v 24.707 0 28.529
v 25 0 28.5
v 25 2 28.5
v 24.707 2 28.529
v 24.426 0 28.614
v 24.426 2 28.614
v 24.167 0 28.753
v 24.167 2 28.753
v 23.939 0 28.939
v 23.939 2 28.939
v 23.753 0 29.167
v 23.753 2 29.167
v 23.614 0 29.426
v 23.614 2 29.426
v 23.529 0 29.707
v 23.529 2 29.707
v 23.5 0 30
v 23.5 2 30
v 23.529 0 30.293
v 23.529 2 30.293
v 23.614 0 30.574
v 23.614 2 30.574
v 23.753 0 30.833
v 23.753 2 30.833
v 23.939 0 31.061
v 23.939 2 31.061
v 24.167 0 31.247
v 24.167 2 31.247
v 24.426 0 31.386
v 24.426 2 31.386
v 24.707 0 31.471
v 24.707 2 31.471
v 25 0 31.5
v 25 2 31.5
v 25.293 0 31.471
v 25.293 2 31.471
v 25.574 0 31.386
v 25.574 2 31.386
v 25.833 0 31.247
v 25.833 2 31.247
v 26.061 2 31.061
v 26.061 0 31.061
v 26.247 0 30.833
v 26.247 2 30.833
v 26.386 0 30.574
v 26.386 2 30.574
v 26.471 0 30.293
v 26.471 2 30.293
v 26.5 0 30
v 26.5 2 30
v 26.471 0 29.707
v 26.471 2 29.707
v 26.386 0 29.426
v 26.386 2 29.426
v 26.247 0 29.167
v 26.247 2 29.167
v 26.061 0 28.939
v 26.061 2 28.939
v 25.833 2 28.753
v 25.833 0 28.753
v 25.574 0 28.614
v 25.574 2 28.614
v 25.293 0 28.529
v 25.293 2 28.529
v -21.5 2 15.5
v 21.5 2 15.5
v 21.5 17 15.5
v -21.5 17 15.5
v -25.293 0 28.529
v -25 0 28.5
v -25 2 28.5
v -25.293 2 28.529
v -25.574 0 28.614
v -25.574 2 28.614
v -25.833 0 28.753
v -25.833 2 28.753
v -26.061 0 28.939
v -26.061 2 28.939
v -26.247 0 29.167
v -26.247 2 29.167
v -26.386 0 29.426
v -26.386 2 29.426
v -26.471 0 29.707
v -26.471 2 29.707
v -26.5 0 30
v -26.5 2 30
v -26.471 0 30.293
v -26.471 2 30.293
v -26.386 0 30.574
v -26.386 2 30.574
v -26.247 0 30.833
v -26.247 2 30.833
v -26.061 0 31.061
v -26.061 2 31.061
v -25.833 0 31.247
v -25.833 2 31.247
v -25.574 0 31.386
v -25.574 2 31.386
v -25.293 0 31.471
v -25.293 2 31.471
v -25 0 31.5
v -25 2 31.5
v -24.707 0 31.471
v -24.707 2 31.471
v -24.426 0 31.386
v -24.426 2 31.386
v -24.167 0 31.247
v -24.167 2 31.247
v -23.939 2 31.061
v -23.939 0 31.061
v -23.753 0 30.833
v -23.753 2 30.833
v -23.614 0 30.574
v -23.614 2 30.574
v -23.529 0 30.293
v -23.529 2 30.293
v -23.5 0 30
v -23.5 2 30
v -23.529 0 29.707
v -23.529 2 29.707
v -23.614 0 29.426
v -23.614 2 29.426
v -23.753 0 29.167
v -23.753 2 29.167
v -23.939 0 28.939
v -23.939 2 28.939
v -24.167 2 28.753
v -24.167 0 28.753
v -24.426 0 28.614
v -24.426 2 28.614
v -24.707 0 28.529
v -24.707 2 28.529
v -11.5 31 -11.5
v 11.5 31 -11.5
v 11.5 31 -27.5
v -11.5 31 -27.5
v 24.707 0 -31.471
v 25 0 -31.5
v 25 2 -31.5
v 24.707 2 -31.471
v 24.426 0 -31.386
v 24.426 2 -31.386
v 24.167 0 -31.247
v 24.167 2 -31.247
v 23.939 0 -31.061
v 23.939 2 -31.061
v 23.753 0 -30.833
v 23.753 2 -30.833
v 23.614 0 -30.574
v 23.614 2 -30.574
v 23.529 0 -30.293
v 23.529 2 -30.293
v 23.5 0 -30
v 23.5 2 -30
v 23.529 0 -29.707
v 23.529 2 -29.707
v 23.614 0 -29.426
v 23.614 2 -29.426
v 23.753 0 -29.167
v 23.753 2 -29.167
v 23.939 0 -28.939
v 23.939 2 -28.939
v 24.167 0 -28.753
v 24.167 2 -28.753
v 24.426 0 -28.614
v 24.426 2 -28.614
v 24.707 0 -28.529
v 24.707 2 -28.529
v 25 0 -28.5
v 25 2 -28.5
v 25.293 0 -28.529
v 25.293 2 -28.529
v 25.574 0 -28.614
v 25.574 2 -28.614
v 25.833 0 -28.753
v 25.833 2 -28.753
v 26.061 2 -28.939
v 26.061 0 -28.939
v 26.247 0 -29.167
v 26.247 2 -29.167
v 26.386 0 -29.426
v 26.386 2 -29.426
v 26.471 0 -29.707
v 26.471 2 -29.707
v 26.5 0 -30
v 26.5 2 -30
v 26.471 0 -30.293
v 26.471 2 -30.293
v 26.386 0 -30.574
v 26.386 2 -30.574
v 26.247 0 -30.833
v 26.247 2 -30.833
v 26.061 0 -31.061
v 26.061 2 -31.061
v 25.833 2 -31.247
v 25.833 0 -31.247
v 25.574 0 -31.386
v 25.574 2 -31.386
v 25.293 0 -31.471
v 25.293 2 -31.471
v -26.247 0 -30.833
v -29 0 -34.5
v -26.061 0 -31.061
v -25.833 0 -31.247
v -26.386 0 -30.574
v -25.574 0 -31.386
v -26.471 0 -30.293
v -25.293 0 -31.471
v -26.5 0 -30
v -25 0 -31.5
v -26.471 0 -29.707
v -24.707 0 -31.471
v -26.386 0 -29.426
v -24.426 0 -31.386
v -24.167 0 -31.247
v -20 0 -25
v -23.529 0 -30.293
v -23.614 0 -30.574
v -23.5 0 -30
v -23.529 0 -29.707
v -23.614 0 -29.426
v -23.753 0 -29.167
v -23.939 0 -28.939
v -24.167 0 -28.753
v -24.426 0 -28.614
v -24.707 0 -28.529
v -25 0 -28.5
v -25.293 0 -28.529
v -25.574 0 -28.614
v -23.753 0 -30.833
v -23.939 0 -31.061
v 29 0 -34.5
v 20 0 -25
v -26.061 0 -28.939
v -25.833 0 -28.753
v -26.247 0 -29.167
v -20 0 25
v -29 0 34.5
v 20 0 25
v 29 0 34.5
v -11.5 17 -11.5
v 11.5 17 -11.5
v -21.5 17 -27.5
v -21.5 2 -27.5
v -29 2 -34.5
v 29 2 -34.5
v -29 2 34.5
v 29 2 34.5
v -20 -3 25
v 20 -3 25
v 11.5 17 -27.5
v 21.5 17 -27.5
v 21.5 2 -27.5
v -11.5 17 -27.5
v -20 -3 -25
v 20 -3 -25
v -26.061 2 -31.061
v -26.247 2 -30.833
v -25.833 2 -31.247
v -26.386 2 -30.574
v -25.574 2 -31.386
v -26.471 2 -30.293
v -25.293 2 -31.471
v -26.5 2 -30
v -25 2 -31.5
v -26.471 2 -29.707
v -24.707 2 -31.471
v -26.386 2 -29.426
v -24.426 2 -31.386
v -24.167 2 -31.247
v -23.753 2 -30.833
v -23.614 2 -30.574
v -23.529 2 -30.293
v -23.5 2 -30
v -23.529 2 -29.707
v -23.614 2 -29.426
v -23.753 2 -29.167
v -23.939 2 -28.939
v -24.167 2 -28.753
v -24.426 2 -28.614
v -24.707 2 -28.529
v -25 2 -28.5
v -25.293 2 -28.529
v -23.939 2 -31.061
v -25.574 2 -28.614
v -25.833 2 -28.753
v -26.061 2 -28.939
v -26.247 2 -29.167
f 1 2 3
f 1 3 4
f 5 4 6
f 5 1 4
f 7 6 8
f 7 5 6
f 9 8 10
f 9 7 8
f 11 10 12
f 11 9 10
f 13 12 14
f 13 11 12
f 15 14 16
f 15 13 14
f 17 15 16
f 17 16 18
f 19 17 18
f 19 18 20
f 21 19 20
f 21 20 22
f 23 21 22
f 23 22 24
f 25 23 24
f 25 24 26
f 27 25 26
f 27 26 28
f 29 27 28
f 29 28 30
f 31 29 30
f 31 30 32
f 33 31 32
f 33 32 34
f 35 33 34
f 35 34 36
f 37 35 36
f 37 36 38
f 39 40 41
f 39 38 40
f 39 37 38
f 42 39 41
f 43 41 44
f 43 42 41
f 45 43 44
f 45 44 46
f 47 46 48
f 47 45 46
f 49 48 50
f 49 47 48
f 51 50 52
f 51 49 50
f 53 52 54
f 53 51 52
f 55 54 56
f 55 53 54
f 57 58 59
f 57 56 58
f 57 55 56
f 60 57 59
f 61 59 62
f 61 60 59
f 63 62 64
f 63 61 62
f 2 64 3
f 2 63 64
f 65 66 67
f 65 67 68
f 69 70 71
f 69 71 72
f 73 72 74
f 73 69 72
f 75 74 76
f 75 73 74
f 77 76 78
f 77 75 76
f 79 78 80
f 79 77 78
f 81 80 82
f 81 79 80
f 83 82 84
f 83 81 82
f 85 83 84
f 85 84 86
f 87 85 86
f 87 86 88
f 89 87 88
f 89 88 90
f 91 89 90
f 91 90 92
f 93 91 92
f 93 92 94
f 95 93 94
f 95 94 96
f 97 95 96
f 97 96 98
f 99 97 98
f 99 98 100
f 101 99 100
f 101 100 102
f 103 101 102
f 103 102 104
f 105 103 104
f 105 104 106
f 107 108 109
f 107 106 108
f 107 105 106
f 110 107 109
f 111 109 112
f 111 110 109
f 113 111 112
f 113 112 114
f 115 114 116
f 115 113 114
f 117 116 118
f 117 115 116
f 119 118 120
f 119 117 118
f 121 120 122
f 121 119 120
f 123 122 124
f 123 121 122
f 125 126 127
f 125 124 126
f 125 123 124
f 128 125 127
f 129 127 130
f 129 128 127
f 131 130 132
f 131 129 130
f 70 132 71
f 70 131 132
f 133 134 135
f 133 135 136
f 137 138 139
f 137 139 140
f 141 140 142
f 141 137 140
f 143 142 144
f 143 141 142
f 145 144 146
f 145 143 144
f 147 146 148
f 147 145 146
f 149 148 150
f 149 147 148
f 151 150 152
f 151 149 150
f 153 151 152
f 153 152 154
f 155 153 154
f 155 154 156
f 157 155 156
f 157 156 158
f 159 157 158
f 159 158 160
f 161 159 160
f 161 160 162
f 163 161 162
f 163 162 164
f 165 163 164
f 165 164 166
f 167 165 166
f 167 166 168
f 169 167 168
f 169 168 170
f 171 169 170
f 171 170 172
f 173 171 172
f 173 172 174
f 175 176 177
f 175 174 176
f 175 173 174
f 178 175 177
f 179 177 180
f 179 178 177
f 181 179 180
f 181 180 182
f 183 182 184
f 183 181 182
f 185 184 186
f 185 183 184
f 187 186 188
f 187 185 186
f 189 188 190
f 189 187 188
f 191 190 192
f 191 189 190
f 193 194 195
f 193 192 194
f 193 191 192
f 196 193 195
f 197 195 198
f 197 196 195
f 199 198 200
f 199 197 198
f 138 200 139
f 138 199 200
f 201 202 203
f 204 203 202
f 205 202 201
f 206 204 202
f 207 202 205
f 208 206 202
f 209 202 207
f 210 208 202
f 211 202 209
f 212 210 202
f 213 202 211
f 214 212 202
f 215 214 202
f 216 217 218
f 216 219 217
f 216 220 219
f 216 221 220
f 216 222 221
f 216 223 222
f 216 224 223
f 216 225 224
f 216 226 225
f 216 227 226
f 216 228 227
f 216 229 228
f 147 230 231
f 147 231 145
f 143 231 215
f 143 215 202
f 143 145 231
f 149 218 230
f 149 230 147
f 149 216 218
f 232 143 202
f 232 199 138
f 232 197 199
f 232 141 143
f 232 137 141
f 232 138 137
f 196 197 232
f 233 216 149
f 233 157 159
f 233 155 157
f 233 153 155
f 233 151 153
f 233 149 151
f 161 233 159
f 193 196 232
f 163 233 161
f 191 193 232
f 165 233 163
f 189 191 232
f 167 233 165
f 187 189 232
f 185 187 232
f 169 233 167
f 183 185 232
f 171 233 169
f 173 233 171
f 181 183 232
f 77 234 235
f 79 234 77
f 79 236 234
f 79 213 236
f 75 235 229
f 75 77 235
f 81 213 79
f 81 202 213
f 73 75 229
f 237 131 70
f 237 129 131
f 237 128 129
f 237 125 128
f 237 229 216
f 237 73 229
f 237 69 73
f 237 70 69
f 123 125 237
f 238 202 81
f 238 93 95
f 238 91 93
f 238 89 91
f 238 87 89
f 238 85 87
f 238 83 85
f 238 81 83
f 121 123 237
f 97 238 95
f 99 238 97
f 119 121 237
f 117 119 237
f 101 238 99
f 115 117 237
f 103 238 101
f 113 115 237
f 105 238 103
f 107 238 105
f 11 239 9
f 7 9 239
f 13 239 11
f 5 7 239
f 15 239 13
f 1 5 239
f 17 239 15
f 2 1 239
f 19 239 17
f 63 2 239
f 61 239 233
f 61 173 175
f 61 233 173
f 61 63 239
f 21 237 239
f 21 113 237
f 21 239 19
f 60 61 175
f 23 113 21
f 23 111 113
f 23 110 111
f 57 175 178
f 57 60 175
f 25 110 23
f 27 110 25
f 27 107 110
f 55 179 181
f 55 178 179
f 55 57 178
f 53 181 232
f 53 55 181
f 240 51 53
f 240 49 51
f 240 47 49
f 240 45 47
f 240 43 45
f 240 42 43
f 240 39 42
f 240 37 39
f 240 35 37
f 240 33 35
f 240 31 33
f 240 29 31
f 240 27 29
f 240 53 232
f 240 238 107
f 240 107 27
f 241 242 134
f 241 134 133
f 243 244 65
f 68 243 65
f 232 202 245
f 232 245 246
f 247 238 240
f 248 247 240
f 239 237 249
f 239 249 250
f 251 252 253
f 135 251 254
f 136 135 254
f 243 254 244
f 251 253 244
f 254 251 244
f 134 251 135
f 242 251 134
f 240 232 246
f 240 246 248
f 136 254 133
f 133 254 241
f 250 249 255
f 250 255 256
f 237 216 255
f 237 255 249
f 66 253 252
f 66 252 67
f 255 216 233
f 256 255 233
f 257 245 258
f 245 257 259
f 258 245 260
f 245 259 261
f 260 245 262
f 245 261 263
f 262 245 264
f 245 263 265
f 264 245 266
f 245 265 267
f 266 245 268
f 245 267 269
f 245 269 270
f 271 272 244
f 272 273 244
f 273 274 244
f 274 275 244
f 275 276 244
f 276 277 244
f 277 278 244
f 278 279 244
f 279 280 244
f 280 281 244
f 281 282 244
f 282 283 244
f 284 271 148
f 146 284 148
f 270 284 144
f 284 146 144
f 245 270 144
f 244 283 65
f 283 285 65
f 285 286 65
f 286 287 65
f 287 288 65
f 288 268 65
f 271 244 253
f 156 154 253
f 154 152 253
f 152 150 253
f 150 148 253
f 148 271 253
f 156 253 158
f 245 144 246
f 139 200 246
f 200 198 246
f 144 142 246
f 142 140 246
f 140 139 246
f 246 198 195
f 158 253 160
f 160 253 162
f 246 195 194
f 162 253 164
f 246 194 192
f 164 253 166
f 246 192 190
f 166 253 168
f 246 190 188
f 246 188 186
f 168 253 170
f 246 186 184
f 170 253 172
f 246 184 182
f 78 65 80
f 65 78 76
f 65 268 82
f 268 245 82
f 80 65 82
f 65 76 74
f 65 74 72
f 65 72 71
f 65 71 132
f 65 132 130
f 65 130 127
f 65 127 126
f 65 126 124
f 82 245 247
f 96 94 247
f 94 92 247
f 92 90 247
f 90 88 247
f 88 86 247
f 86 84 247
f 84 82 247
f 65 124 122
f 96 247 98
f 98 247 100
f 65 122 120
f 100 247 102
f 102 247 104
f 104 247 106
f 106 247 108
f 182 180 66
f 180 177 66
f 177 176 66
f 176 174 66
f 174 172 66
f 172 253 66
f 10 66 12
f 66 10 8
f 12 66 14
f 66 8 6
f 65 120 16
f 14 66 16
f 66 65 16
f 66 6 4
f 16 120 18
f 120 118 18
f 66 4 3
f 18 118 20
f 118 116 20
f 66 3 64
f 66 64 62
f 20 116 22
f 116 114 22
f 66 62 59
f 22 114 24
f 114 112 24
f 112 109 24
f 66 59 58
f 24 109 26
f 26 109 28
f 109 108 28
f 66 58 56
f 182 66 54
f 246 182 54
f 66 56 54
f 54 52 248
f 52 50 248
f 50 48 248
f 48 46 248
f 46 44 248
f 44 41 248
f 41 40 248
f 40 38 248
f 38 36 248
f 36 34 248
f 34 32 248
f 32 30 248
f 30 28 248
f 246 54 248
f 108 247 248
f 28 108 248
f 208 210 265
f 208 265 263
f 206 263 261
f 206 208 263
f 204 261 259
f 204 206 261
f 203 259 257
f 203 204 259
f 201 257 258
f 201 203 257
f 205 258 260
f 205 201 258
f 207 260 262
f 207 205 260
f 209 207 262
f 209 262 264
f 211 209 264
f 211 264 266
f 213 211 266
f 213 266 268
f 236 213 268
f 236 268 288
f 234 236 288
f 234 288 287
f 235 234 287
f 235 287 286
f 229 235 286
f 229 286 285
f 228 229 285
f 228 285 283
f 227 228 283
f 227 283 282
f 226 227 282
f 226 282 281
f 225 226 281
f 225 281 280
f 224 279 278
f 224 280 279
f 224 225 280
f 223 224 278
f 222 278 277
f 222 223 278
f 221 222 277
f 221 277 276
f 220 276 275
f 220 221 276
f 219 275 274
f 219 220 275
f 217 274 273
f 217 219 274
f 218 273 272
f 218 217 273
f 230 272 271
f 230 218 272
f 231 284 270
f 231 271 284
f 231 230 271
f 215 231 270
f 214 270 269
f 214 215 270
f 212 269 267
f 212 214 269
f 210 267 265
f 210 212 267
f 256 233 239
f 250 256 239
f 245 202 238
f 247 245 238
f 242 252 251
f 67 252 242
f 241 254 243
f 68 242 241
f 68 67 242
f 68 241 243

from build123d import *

# Parameters (mm, degrees)
SKETCH_1_W                  = 58
SKETCH_1_H                  = 69
EXTRUDE_351_DEPTH           = 2
SKETCH_2_W                  = 43
SKETCH_2_H                  = 43
EXTRUDE_607_DEPTH           = 15
SKETCH_3_W                  = 23
SKETCH_3_H                  = 16
EXTRUDE_850_DEPTH           = 14
SKETCH_4_W                  = 40
SKETCH_4_H                  = 50
EXTRUDE_1071_DEPTH          = 3
CUT_EXTRUDE_1381_DEPTH      = 54.593376456
CUT_EXTRUDE_1381_DEPTH_BACK = 54.593376456
SKETCH_7_R                  = 1.5


with BuildPart() as part:
    # Эскиз1 → Extrude 351 (new body)
    with BuildSketch(Plane.XZ):
        Rectangle(SKETCH_1_W, SKETCH_1_H)
    extrude(amount=-EXTRUDE_351_DEPTH)

    # Эскиз2 → Extrude 607 (add)
    with BuildSketch(Plane(origin=(0, 2, 0), x_dir=(-1, 0, 0), z_dir=(0, 1, 0))):
        with Locations((0, -6)):
            Rectangle(SKETCH_2_W, SKETCH_2_H)
    extrude(amount=EXTRUDE_607_DEPTH)

    # Эскиз3 → Extrude 850 (add)
    with BuildSketch(Plane(origin=(0, 17, 0), x_dir=(-1, 0, 0), z_dir=(0, 1, 0))):
        with Locations((0, -19.5)):
            Rectangle(SKETCH_3_W, SKETCH_3_H)
    extrude(amount=EXTRUDE_850_DEPTH)

    # Эскиз4 → Extrude 1071 (add)
    with BuildSketch(Plane.XZ):
        Rectangle(SKETCH_4_W, SKETCH_4_H)
    extrude(amount=EXTRUDE_1071_DEPTH)

    # Эскиз7 → Cut-Extrude 1381 (cut, two sides: drawn at the far end of the back side and taken through both)
    with BuildSketch(Plane(origin=(0, 2, 0), x_dir=(1, 0, 0), z_dir=(0, 1, 0)).offset(-CUT_EXTRUDE_1381_DEPTH_BACK)):
        with Locations(Location((-25, 30, 0), (0, 0, 90))):
            Circle(SKETCH_7_R)
        with Locations(Location((25, 30, 0), (0, 0, 90))):
            Circle(SKETCH_7_R)
        with Locations(Location((25, -30, 0), (0, 0, 90))):
            Circle(SKETCH_7_R)
        with Locations(Location((-25, -30, 0), (0, 0, 90))):
            Circle(SKETCH_7_R)
    extrude(amount=CUT_EXTRUDE_1381_DEPTH + CUT_EXTRUDE_1381_DEPTH_BACK, mode=Mode.SUBTRACT)


solid = part.part
